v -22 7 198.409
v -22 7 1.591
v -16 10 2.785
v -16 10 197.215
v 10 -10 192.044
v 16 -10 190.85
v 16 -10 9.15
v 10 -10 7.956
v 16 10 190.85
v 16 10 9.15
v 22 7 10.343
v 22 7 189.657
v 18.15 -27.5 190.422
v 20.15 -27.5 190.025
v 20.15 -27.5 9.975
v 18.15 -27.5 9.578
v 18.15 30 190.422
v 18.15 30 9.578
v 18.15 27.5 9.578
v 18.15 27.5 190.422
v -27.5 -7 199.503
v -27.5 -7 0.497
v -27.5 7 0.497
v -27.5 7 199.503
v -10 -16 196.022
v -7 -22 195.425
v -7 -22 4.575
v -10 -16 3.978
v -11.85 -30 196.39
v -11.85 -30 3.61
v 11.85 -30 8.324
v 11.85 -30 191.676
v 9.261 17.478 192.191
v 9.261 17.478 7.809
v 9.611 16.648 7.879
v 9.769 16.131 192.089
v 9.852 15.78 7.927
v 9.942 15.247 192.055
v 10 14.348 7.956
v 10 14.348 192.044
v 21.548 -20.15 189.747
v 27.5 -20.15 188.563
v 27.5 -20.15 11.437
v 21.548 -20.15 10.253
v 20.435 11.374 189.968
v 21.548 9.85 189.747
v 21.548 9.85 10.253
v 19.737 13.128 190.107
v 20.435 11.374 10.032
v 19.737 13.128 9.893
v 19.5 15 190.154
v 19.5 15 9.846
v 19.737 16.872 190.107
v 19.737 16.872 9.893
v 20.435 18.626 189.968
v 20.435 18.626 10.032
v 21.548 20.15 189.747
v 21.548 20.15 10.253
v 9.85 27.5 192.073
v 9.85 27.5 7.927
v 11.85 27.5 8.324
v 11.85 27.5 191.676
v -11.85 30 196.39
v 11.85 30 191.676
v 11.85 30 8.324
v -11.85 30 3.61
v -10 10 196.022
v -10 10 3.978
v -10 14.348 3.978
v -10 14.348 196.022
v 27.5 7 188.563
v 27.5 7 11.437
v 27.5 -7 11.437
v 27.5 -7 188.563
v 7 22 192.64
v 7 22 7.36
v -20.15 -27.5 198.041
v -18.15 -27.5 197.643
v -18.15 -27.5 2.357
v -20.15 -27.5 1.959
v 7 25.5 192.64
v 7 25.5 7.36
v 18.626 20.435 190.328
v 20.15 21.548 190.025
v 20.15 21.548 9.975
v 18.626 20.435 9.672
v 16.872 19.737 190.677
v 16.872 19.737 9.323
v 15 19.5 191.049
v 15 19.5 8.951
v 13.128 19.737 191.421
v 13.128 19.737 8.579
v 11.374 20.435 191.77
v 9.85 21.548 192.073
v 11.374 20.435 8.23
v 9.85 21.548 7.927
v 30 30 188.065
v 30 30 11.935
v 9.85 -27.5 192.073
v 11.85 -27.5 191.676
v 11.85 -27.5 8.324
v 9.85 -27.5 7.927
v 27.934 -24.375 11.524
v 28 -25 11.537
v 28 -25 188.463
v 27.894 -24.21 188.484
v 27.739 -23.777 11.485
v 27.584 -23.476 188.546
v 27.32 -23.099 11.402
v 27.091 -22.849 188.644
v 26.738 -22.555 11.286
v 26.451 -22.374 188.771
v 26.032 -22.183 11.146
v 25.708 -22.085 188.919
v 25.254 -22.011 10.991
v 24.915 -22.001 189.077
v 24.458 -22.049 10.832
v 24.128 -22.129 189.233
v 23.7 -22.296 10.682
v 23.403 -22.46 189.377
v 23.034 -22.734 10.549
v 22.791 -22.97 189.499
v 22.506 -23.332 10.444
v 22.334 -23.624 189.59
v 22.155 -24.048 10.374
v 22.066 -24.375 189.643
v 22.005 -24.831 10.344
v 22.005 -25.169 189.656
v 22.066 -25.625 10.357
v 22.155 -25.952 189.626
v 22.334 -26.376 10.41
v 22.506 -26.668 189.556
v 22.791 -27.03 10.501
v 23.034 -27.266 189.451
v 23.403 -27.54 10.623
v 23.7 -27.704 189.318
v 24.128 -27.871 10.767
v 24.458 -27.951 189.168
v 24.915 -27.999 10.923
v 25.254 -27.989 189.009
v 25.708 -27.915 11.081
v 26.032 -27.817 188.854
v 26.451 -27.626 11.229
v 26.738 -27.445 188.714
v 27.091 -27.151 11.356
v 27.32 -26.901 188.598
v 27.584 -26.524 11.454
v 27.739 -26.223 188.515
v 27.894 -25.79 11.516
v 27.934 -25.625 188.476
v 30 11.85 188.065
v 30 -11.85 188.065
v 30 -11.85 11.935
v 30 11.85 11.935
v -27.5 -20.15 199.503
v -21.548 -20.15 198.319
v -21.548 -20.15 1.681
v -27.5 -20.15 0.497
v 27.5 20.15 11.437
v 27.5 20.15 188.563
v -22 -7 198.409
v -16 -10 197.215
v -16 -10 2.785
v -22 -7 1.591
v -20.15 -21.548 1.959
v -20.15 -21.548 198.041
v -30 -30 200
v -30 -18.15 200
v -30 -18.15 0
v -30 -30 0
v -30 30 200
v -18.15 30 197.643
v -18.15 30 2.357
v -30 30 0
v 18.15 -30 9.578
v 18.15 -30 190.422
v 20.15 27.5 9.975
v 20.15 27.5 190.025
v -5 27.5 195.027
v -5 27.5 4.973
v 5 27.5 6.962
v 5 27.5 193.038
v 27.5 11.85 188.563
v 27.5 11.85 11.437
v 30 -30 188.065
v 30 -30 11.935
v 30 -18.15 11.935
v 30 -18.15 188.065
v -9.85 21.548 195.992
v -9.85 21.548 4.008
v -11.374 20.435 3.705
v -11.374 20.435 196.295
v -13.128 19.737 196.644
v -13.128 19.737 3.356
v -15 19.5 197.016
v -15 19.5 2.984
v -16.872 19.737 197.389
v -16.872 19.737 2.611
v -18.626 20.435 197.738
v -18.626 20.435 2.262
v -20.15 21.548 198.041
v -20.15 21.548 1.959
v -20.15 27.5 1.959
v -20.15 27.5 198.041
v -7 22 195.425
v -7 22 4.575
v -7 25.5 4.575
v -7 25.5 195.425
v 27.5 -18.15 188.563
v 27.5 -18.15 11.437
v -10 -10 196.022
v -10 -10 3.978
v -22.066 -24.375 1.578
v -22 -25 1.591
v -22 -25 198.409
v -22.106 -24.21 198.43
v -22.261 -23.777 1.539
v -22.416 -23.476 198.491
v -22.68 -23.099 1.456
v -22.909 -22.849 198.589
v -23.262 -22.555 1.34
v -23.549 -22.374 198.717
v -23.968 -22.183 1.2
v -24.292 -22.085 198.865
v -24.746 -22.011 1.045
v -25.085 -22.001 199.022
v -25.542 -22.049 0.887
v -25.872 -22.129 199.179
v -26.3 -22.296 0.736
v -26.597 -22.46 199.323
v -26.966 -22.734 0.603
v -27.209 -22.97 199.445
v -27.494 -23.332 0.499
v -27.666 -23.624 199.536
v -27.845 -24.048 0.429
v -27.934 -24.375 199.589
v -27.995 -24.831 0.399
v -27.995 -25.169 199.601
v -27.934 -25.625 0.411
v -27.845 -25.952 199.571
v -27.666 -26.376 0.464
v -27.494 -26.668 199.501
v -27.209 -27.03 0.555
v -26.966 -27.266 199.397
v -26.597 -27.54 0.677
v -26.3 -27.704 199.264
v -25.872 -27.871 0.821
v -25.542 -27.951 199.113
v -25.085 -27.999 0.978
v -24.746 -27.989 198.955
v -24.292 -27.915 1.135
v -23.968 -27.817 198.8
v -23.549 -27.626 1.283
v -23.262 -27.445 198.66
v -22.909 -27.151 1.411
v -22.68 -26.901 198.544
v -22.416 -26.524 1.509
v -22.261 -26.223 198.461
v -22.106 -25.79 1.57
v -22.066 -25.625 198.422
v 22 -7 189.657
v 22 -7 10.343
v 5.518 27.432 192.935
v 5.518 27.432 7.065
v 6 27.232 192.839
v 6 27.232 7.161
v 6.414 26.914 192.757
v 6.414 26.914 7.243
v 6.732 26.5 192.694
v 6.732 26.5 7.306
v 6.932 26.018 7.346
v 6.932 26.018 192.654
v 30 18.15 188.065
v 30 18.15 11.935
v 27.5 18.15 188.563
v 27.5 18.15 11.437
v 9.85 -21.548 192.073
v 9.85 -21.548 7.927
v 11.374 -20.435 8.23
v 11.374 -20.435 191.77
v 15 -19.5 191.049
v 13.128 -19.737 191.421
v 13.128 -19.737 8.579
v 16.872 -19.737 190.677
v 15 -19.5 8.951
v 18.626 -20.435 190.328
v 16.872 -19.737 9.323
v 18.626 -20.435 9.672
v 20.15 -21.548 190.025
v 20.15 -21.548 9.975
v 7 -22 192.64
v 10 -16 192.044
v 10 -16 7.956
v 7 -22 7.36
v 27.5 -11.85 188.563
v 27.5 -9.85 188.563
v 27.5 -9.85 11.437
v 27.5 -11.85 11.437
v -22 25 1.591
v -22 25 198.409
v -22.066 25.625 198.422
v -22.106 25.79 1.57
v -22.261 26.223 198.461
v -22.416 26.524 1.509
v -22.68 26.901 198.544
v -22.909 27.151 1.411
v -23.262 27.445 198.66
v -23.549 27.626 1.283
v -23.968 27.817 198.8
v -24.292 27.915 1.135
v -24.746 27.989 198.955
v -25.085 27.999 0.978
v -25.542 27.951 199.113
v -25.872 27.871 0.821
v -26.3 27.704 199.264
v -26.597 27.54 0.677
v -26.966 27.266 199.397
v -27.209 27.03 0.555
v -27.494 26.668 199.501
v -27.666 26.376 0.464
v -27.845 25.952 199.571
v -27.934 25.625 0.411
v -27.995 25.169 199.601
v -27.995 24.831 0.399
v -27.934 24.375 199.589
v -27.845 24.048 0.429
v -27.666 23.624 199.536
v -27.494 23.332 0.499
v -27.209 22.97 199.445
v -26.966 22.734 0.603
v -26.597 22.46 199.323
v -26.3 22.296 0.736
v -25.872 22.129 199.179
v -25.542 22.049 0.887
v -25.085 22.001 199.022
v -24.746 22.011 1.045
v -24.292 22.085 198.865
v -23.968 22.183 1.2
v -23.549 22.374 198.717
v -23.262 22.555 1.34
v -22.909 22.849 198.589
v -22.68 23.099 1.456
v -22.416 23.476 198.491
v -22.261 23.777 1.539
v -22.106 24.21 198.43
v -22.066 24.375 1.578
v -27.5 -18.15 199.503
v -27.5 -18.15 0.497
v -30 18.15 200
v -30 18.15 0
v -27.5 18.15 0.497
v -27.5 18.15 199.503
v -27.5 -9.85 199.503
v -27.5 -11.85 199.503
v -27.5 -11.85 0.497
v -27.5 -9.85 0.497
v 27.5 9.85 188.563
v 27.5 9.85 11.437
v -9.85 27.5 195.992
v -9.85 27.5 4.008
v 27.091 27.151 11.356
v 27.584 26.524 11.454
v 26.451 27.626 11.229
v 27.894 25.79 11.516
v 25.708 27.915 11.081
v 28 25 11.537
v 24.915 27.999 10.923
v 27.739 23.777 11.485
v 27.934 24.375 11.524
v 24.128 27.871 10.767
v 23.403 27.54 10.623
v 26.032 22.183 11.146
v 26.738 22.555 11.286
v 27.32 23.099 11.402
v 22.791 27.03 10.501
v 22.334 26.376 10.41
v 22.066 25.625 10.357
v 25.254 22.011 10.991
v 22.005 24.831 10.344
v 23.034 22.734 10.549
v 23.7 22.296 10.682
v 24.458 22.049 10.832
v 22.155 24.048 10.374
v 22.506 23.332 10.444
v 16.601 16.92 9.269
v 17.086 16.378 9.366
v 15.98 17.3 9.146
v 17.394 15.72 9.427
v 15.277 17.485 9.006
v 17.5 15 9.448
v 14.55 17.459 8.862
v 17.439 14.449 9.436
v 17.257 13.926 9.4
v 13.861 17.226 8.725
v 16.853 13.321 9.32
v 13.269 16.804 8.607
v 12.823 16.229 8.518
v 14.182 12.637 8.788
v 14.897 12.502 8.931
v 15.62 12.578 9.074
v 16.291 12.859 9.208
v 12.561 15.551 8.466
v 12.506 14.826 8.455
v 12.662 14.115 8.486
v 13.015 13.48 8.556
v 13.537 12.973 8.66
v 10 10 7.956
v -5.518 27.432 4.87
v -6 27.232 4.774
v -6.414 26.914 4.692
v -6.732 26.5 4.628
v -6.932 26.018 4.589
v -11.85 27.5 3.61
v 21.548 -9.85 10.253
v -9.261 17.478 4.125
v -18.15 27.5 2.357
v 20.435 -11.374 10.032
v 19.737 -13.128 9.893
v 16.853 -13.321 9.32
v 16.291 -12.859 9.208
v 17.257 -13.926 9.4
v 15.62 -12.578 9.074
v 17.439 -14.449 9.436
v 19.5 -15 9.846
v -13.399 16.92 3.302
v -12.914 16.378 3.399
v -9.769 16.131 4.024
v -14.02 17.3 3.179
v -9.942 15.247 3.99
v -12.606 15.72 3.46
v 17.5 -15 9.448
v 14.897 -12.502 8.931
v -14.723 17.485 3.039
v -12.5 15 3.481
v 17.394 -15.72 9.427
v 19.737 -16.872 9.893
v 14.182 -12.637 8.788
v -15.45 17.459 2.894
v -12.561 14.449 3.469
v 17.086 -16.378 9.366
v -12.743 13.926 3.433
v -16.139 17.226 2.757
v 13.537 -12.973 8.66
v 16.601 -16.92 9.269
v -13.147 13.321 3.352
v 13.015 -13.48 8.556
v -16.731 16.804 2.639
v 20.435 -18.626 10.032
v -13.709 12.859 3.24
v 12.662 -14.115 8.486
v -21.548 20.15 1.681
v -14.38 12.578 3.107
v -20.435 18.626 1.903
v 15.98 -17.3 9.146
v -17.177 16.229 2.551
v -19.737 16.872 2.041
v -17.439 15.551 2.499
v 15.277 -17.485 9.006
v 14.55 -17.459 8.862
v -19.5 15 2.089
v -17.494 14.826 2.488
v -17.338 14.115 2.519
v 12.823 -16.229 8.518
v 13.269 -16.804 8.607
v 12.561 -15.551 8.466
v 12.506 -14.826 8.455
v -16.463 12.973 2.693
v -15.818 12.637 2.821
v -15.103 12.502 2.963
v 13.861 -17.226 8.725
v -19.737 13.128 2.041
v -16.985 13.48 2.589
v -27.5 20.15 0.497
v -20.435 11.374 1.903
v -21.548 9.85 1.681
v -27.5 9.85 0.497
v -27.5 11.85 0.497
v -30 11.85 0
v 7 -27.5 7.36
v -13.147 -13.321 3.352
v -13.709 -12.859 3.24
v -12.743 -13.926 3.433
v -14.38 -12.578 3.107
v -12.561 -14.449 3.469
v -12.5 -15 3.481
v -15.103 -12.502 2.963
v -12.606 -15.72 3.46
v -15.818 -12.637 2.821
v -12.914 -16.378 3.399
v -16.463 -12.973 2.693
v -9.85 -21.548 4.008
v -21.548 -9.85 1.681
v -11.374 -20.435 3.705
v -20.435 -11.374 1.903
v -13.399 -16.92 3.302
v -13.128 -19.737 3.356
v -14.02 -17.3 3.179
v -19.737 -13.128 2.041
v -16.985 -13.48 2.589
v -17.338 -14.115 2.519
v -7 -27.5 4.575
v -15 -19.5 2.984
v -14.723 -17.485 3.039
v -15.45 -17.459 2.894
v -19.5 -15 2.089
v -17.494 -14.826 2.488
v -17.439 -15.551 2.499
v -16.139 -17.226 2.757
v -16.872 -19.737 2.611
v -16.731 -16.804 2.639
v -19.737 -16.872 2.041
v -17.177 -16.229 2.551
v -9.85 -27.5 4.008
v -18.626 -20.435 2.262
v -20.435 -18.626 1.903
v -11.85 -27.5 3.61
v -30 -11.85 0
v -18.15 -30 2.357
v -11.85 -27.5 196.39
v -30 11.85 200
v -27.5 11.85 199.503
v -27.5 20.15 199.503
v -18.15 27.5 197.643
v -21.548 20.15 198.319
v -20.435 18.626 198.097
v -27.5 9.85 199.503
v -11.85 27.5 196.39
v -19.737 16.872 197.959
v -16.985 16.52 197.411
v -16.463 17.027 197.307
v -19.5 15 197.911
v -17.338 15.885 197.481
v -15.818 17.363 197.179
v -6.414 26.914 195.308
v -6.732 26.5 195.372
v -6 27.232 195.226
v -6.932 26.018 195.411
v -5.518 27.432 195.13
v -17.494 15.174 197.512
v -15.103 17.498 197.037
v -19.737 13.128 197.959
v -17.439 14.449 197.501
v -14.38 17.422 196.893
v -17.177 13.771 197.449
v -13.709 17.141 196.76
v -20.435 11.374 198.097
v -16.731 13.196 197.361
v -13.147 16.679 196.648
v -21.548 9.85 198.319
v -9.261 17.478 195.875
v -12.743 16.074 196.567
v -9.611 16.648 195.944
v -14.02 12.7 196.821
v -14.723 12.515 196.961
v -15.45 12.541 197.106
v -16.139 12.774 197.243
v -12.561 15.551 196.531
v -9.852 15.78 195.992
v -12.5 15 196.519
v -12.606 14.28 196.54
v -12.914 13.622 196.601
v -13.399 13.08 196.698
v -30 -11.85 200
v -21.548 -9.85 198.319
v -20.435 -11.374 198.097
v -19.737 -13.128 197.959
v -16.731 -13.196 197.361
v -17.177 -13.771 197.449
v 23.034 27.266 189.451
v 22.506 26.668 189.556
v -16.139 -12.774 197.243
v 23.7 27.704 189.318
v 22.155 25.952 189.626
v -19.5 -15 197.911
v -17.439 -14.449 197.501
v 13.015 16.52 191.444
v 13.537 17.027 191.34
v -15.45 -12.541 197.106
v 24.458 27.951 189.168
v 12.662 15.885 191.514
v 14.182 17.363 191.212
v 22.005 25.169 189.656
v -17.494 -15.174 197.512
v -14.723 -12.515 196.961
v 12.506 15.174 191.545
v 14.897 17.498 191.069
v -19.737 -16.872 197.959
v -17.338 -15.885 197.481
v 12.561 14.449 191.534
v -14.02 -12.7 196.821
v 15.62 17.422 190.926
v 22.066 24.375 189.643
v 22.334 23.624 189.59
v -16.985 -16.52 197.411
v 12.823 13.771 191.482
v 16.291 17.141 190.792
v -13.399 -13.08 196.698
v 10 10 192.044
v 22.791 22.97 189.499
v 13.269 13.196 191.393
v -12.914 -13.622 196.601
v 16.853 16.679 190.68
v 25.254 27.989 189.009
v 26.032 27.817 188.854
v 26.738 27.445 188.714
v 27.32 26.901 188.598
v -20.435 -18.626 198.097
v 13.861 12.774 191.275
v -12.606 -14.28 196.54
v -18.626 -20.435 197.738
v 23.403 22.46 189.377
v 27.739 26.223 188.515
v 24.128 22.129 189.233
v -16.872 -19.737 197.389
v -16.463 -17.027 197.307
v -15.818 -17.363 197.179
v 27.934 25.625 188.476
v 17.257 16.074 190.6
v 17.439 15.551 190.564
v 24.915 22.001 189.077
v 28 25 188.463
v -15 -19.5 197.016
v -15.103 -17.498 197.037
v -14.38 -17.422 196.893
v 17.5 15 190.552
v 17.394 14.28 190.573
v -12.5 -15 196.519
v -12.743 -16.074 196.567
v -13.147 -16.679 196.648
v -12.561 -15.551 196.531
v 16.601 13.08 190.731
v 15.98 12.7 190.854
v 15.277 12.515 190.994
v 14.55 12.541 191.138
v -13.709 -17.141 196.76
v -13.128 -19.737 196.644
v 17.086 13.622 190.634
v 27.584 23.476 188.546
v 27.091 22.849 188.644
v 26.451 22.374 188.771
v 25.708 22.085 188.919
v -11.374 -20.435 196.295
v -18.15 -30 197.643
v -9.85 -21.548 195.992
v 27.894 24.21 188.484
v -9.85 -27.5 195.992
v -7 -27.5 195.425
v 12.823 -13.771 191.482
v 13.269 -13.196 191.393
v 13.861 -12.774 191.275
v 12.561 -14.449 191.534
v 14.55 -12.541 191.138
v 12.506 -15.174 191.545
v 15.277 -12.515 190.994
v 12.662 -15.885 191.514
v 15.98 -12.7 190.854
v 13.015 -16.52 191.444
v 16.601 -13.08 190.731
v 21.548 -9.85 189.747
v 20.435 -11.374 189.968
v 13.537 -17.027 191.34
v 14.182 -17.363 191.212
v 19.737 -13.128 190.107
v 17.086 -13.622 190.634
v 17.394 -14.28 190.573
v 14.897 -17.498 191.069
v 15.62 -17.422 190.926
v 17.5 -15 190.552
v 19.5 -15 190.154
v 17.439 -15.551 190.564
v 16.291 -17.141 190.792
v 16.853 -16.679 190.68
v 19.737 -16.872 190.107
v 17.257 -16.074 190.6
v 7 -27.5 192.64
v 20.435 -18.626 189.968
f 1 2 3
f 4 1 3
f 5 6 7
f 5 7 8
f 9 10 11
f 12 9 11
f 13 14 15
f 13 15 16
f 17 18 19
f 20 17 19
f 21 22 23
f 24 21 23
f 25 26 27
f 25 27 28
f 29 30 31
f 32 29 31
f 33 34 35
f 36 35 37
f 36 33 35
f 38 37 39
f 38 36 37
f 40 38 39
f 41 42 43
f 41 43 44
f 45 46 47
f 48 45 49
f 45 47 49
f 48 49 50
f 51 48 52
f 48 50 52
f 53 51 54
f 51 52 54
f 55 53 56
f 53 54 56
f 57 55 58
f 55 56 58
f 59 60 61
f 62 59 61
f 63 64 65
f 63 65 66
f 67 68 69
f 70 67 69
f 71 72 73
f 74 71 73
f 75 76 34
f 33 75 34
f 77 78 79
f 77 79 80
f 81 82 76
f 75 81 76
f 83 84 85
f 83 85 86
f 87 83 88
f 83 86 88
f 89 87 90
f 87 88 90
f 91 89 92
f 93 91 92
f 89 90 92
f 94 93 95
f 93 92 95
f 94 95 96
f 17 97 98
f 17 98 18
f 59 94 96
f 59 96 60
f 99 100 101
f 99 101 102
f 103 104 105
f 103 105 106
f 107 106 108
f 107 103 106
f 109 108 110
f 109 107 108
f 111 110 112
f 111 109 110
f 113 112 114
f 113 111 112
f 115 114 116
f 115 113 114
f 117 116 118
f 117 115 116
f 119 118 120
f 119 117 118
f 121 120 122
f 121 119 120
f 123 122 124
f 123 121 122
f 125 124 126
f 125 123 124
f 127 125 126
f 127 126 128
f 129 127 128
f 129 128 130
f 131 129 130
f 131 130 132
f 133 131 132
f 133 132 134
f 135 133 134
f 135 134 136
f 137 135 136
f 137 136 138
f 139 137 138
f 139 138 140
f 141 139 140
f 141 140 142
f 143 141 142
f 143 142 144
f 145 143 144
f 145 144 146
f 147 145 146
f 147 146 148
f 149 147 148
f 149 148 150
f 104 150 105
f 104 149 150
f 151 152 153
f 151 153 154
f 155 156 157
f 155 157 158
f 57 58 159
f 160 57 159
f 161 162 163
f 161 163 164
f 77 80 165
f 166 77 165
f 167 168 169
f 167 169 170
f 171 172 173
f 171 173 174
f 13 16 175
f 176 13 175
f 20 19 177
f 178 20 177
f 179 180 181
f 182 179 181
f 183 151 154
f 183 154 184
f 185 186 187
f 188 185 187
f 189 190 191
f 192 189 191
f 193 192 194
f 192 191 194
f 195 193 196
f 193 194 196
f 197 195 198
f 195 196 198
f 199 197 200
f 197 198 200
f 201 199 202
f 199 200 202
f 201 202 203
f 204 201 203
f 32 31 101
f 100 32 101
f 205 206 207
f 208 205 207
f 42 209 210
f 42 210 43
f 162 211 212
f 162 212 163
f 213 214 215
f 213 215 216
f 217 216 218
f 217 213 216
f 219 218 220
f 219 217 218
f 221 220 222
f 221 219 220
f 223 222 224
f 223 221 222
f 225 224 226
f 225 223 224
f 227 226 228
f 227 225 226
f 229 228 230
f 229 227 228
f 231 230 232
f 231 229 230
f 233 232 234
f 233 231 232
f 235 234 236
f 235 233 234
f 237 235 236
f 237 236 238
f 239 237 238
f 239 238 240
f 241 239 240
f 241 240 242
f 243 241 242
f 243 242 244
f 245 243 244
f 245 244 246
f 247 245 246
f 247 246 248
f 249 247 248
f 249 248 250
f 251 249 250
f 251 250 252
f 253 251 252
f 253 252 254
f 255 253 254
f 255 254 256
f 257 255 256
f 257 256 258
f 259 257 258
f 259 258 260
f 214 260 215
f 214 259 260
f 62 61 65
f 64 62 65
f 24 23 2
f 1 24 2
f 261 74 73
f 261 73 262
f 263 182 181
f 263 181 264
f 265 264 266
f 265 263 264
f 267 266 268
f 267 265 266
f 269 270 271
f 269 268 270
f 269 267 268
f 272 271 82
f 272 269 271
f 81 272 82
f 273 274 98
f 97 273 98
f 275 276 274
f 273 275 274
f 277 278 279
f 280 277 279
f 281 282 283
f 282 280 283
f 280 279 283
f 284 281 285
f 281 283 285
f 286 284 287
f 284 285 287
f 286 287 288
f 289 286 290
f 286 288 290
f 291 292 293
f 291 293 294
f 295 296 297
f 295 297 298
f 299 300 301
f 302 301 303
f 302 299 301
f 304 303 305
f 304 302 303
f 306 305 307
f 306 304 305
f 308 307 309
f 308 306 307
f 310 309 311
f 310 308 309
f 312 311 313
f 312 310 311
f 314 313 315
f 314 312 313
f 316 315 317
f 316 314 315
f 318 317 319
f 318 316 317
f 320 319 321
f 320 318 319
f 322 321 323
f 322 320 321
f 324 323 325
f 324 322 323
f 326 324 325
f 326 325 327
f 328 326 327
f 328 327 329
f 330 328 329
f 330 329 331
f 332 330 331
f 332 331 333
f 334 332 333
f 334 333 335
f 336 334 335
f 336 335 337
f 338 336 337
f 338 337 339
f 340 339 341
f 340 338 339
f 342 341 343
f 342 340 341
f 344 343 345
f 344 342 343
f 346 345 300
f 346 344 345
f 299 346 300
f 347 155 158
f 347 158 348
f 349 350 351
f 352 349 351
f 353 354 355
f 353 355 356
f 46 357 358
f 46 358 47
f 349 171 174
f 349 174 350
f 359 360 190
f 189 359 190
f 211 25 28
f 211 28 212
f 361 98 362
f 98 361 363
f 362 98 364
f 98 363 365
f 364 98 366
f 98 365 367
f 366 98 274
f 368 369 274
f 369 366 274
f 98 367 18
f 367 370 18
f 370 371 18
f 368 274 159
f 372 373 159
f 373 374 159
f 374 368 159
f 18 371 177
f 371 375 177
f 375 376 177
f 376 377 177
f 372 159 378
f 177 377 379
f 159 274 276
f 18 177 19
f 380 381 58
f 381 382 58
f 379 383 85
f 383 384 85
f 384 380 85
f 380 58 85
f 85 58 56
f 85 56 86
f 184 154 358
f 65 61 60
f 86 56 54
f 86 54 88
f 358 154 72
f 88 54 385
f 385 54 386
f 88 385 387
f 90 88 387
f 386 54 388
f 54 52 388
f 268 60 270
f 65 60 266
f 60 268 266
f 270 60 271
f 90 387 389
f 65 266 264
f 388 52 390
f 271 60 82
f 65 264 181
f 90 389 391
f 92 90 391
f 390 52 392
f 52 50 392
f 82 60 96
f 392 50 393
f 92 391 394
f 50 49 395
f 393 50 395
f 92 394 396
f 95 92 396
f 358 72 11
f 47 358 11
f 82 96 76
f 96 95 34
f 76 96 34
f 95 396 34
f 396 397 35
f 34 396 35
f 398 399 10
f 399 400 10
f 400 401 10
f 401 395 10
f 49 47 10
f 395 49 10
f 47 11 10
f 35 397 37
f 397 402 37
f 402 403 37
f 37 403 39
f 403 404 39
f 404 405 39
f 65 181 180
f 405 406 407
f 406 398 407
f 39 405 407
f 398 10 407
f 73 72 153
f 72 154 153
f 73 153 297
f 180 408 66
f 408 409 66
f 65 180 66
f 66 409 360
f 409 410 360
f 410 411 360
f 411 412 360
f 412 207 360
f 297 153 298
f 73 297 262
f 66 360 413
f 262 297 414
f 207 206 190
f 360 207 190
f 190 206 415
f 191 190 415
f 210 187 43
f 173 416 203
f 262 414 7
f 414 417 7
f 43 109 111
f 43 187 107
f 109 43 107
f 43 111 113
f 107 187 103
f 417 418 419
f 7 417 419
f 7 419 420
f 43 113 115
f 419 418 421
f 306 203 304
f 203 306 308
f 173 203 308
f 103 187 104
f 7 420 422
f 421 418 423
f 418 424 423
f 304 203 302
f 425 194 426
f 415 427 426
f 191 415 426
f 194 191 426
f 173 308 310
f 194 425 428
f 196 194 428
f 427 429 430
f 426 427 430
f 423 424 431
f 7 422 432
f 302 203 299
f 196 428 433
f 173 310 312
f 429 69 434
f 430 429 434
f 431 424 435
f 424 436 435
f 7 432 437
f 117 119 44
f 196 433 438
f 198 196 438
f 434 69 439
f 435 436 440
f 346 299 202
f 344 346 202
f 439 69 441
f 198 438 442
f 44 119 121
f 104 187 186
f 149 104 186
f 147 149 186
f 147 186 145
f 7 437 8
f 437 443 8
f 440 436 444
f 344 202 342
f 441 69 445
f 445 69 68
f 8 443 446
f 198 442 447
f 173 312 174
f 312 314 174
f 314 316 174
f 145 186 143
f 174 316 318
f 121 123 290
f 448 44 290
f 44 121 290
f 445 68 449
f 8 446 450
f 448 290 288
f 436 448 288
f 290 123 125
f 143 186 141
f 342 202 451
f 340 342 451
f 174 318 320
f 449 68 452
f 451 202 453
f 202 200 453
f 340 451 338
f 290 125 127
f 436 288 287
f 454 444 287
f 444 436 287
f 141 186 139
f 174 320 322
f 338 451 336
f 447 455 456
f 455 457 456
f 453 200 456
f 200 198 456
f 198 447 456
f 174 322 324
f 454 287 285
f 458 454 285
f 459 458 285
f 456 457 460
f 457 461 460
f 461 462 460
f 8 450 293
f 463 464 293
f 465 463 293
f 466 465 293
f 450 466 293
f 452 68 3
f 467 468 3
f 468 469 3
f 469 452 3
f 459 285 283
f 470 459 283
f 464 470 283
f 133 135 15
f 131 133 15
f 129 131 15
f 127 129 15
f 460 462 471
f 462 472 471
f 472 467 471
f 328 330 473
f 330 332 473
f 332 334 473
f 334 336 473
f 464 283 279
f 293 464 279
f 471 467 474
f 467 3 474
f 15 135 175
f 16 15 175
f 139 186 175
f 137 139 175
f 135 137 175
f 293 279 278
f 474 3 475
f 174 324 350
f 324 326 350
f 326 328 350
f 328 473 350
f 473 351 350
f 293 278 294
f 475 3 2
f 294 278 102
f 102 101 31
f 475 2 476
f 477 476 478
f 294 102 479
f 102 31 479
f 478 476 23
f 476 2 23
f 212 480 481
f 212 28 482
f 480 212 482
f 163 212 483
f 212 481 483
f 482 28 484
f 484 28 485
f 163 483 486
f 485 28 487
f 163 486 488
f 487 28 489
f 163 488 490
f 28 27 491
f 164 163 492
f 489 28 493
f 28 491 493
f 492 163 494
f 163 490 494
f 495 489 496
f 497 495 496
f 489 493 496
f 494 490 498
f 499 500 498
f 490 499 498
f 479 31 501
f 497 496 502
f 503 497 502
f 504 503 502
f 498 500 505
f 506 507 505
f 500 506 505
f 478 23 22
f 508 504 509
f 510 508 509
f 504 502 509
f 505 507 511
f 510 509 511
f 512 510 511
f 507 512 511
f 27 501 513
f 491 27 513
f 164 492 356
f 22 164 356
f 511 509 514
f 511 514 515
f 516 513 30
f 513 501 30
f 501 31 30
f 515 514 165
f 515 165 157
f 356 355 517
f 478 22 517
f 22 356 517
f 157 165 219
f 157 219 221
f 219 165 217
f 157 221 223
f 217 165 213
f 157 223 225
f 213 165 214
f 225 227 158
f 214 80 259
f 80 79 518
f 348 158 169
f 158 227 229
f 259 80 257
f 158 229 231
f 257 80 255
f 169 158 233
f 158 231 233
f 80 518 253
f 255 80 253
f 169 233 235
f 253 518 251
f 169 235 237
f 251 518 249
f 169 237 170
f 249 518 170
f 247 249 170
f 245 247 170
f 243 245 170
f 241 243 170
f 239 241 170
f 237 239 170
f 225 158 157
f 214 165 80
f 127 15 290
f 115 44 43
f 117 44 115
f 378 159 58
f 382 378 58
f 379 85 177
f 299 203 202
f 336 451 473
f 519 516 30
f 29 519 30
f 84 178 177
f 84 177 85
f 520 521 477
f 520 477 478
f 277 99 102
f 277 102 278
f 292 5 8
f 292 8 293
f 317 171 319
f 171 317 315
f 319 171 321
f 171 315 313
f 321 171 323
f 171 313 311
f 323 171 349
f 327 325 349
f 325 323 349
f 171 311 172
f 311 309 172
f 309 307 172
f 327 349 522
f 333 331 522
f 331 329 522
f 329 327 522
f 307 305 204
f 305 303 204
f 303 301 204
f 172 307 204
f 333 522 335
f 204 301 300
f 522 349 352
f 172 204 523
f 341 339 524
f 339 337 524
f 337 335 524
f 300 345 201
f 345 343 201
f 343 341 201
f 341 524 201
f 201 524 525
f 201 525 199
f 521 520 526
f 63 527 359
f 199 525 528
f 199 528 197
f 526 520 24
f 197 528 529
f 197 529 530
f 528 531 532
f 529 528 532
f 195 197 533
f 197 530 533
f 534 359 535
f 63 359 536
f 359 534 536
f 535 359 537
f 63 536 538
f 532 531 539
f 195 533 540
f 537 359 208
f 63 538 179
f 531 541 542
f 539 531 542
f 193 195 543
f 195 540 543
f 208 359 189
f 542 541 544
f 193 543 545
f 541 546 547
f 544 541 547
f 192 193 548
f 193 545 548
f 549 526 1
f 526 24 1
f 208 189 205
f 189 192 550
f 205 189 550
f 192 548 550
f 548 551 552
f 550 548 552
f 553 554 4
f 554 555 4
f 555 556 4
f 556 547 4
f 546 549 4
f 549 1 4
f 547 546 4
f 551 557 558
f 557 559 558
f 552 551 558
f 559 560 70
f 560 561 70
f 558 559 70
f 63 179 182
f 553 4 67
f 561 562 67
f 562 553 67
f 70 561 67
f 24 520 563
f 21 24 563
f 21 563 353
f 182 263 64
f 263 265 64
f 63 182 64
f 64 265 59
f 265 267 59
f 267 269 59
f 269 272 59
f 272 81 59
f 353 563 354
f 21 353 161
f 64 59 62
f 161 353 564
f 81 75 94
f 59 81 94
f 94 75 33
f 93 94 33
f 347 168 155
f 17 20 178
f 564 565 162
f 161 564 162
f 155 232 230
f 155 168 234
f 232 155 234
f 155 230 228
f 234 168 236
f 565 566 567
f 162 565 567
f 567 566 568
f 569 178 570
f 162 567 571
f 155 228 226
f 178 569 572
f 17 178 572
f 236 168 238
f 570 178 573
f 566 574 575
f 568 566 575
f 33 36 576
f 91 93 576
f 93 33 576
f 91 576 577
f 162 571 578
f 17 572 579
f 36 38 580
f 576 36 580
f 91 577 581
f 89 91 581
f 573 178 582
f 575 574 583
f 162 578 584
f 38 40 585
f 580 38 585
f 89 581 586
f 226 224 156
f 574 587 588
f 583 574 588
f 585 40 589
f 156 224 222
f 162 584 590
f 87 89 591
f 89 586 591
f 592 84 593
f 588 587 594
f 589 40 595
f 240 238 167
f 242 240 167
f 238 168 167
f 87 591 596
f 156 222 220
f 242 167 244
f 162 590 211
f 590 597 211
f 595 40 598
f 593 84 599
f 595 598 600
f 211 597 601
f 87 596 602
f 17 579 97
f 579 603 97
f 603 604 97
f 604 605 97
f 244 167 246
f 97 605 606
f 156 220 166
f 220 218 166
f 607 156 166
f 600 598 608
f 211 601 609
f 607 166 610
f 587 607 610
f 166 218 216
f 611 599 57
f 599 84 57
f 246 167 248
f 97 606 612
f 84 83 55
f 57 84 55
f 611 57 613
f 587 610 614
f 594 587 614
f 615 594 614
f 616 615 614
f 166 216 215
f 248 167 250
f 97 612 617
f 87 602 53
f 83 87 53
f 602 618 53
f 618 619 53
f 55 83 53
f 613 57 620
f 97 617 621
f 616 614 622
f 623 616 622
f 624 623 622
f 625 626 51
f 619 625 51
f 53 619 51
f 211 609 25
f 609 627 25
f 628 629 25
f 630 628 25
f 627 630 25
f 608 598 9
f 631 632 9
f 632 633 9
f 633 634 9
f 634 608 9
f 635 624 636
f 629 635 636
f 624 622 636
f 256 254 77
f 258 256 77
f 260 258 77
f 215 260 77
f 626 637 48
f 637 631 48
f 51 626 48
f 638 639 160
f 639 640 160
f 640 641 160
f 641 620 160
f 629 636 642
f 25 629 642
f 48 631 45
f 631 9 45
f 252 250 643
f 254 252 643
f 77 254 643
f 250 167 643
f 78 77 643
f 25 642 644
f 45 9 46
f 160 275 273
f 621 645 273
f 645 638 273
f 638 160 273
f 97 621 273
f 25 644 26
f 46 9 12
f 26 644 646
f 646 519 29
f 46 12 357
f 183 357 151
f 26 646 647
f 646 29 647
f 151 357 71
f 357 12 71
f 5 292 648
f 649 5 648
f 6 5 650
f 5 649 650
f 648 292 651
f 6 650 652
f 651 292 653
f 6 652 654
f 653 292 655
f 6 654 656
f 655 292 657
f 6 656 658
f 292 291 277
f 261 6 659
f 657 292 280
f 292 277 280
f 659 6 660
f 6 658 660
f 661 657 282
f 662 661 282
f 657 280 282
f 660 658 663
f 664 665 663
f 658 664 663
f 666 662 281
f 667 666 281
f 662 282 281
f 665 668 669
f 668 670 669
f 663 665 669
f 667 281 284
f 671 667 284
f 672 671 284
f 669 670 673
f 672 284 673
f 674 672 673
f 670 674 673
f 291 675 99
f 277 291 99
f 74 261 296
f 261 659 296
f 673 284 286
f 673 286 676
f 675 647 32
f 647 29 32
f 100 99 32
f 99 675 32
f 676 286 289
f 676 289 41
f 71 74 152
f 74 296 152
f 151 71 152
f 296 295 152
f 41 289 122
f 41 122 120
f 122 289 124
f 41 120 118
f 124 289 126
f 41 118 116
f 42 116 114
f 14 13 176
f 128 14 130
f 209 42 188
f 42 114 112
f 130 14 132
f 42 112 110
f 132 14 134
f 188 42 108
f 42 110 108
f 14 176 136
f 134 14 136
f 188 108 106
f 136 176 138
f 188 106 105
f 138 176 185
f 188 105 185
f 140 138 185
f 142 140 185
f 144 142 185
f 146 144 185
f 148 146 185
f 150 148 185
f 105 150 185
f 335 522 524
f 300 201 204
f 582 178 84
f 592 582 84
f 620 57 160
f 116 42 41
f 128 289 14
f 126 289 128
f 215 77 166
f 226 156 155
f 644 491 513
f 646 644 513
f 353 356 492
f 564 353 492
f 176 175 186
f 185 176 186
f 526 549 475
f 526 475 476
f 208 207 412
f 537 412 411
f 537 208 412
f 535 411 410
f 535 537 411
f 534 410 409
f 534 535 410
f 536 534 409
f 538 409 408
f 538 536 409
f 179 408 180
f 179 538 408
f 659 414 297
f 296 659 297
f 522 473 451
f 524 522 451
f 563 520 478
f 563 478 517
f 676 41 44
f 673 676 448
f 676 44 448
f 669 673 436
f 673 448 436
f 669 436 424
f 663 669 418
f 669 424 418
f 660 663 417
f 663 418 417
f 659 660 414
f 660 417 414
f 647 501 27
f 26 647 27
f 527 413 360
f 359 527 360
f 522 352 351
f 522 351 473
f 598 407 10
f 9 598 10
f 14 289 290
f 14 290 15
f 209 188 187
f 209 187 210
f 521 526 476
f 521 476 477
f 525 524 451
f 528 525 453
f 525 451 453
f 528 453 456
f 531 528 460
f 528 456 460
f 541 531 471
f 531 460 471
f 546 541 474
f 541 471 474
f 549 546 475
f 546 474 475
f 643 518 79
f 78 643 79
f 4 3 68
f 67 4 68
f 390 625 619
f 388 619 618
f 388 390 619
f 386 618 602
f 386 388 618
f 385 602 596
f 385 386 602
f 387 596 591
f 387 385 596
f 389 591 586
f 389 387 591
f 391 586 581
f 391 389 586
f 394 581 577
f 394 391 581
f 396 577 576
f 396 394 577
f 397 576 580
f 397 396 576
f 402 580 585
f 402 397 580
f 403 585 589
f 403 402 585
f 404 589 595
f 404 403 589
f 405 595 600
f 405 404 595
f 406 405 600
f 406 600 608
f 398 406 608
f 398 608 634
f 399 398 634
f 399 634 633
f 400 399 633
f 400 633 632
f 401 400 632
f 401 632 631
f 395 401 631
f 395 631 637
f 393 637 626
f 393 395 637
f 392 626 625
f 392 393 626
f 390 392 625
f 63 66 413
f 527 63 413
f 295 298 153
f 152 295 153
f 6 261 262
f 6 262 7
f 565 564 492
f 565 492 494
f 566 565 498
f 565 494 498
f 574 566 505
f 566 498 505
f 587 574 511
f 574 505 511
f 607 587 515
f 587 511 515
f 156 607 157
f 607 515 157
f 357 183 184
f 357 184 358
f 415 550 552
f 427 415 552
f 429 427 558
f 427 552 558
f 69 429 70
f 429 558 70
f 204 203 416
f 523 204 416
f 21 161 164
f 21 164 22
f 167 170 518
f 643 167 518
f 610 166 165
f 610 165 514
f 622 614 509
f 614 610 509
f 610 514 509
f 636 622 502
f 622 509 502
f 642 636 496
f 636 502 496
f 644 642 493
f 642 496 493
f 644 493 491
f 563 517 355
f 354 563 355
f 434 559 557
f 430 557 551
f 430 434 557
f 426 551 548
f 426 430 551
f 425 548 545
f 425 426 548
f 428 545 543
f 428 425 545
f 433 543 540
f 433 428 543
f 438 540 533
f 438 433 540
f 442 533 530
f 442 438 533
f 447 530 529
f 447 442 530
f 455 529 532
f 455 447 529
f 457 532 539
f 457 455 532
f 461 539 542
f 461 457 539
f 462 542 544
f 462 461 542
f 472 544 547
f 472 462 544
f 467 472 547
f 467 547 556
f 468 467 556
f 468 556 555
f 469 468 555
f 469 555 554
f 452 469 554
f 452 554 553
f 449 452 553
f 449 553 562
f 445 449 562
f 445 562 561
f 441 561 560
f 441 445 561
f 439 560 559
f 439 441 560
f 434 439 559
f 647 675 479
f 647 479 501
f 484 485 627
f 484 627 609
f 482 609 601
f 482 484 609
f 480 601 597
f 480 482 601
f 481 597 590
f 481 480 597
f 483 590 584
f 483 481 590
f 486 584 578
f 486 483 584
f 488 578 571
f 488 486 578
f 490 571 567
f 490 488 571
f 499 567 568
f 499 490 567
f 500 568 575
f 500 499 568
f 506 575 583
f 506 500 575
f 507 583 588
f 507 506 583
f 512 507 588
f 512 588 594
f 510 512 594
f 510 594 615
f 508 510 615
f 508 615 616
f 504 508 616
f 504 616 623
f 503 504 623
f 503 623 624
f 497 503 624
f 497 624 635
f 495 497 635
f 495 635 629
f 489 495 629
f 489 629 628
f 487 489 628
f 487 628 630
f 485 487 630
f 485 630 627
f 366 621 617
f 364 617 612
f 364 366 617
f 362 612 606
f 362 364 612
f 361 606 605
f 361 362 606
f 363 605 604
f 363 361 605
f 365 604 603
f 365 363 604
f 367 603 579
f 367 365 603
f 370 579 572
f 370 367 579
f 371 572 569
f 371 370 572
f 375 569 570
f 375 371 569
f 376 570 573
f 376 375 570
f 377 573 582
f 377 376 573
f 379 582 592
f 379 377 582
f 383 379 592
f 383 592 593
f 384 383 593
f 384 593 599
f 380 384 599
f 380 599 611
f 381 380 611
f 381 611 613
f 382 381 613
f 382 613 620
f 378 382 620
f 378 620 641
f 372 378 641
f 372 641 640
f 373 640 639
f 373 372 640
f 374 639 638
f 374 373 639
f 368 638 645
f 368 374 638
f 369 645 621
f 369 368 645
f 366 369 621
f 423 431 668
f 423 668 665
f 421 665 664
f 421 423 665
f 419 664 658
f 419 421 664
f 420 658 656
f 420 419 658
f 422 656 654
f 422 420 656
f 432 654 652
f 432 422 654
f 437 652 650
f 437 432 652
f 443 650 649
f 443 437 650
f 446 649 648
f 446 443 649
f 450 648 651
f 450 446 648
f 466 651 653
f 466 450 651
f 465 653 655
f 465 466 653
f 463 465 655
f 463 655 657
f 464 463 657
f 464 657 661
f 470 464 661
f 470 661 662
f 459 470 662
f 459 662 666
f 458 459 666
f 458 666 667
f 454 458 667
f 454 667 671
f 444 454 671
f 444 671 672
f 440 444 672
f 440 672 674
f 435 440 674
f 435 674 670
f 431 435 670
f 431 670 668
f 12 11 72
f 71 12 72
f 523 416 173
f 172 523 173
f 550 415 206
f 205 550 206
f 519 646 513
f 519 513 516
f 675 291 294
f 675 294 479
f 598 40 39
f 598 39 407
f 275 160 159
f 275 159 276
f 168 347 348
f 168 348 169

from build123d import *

# Parameters (mm, degrees)
F0_R          = 3
F0_R_2        = 2.5
F1_DEPTH      = 200
F2_R          = 2
F3_R          = 7
F6_DEPTH      = 30
F6_DEPTH_BACK = 30


# Not quite as in the source:
# - a feature names something its author has since deleted; it is built from what else it names


with BuildPart() as f1:
    # F0 (on Top) → F1 (new body)
    with BuildSketch(Plane.XY):
        with BuildLine():
            Line((18.15, -30), (30, -30))
            Line((30, -30), (30, -18.15))
            Line((30, -18.15), (27.5, -18.15))
            Line((27.5, -18.15), (27.5, -20.15))
            Line((27.5, -20.15), (21.5477069044, -20.15))
            ThreePointArc((21.5477069044, -20.15), (19.5, -15), (21.5477069044, -9.85))
            Line((21.5477069044, -9.85), (27.5, -9.85))
            Line((27.5, -9.85), (27.5, -11.85))
            Line((27.5, -11.85), (30, -11.85))
            Line((30, -11.85), (30, 11.85))
            Line((30, 11.85), (27.5, 11.85))
            Line((27.5, 11.85), (27.5, 9.85))
            Line((27.5, 9.85), (21.5477069044, 9.85))
            ThreePointArc((21.5477069044, 9.85), (19.5, 15), (21.5477069044, 20.15))
            Line((21.5477069044, 20.15), (27.5, 20.15))
            Line((27.5, 20.15), (27.5, 18.15))
            Line((27.5, 18.15), (30, 18.15))
            Line((30, 18.15), (30, 30))
            Line((30, 30), (18.15, 30))
            Line((18.15, 30), (18.15, 27.5))
            Line((18.15, 27.5), (20.15, 27.5))
            Line((20.15, 27.5), (20.15, 21.5477069044))
            ThreePointArc((20.15, 21.5477069044), (15, 19.5), (9.85, 21.5477069044))
            Line((9.85, 21.5477069044), (9.85, 27.5))
            Line((9.85, 27.5), (11.85, 27.5))
            Line((11.85, 27.5), (11.85, 30))
            Line((11.85, 30), (-11.85, 30))
            Line((-11.85, 30), (-11.85, 27.5))
            Line((-11.85, 27.5), (-9.85, 27.5))
            Line((-9.85, 27.5), (-9.85, 21.5477069044))
            ThreePointArc((-9.85, 21.5477069044), (-15, 19.5), (-20.15, 21.5477069044))
            Line((-20.15, 21.5477069044), (-20.15, 27.5))
            Line((-20.15, 27.5), (-18.15, 27.5))
            Line((-18.15, 27.5), (-18.15, 30))
            Line((-18.15, 30), (-30, 30))
            Line((-30, 30), (-30, 18.15))
            Line((-30, 18.15), (-27.5, 18.15))
            Line((-27.5, 18.15), (-27.5, 20.15))
            Line((-27.5, 20.15), (-21.5477069044, 20.15))
            ThreePointArc((-21.5477069044, 20.15), (-19.5, 15), (-21.5477069044, 9.85))
            Line((-21.5477069044, 9.85), (-27.5, 9.85))
            Line((-27.5, 9.85), (-27.5, 11.85))
            Line((-27.5, 11.85), (-30, 11.85))
            Line((-30, 11.85), (-30, -11.85))
            Line((-30, -11.85), (-27.5, -11.85))
            Line((-27.5, -11.85), (-27.5, -9.85))
            Line((-27.5, -9.85), (-21.5477069044, -9.85))
            ThreePointArc((-21.5477069044, -9.85), (-19.5, -15), (-21.5477069044, -20.15))
            Line((-21.5477069044, -20.15), (-27.5, -20.15))
            Line((-27.5, -20.15), (-27.5, -18.15))
            Line((-27.5, -18.15), (-30, -18.15))
            Line((-30, -18.15), (-30, -30))
            Line((-30, -30), (-18.15, -30))
            Line((-18.15, -30), (-18.15, -27.5))
            Line((-18.15, -27.5), (-20.15, -27.5))
            Line((-20.15, -27.5), (-20.15, -21.5477069044))
            ThreePointArc((-20.15, -21.5477069044), (-15, -19.5), (-9.85, -21.5477069044))
            Line((-9.85, -21.5477069044), (-9.85, -27.5))
            Line((-9.85, -27.5), (-11.85, -27.5))
            Line((-11.85, -27.5), (-11.85, -30))
            Line((-11.85, -30), (11.85, -30))
            Line((11.85, -30), (11.85, -27.5))
            Line((11.85, -27.5), (9.85, -27.5))
            Line((9.85, -27.5), (9.85, -21.5477069044))
            ThreePointArc((9.85, -21.5477069044), (15, -19.5), (20.15, -21.5477069044))
            Line((20.15, -21.5477069044), (20.15, -27.5))
            Line((20.15, -27.5), (18.15, -27.5))
            Line((18.15, -27.5), (18.15, -30))
        make_face()
        with Locations((-25, -25)):
            Circle(F0_R, mode=Mode.SUBTRACT)
        with Locations((-15, -15)):
            Circle(F0_R_2, mode=Mode.SUBTRACT)
        with Locations((25, -25)):
            Circle(F0_R, mode=Mode.SUBTRACT)
        with Locations((15, -15)):
            Circle(F0_R_2, mode=Mode.SUBTRACT)
        with Locations((-25, 25)):
            Circle(F0_R, mode=Mode.SUBTRACT)
        with Locations((-15, 15)):
            Circle(F0_R_2, mode=Mode.SUBTRACT)
        Polygon((-7, 22), (-7, 27.5), (0, 27.5), (7, 27.5), (7, 22), (10, 16), (10, 10), (16, 10), (22, 7), (27.5, 7), (27.5, 0), (27.5, -7), (22, -7), (16, -10), (10, -10), (10, -16), (7, -22), (7, -27.5), (0, -27.5), (-7, -27.5), (-7, -22), (-10, -16), (-10, -10), (-16, -10), (-22, -7), (-27.5, -7), (-27.5, 0), (-27.5, 7), (-22, 7), (-16, 10), (-10, 10), (-10, 16), align=None, mode=Mode.SUBTRACT)
        with Locations((15, 15)):
            Circle(F0_R_2, mode=Mode.SUBTRACT)
        with Locations((25, 25)):
            Circle(F0_R, mode=Mode.SUBTRACT)
    extrude(amount=F1_DEPTH)

    # F2
    f2_edges = [f1.edges().sort_by_distance(p)[0] for p in [
        (-7, 27.5, 100),
        (7, 27.5, 100),
    ]]
    fillet(f2_edges, radius=F2_R)

    # F3
    f3_edges = [f1.edges().sort_by_distance(p)[0] for p in [
        (-10, 16, 100),
        (10, 16, 100),
    ]]
    fillet(f3_edges, radius=F3_R)

    # F5 (on Front) → F6 (cut, two sides)
    with BuildSketch(Plane.XZ) as f6_sk:
        Polygon((161.6827257777, -158.1931300344), (124.1182914407, 30.656034207), (-30, 0), (7.5644343369, -188.8491642414), align=None)
        Polygon((119.7769204661, 170.2075181713), (153.4553825462, 339.5205806204), (3.6784620801, 369.3130624492), (-30, 200), align=None)
    extrude(amount=F6_DEPTH, mode=Mode.SUBTRACT)
    extrude(f6_sk.sketch, amount=-F6_DEPTH_BACK, mode=Mode.SUBTRACT)


solid = f1.part
